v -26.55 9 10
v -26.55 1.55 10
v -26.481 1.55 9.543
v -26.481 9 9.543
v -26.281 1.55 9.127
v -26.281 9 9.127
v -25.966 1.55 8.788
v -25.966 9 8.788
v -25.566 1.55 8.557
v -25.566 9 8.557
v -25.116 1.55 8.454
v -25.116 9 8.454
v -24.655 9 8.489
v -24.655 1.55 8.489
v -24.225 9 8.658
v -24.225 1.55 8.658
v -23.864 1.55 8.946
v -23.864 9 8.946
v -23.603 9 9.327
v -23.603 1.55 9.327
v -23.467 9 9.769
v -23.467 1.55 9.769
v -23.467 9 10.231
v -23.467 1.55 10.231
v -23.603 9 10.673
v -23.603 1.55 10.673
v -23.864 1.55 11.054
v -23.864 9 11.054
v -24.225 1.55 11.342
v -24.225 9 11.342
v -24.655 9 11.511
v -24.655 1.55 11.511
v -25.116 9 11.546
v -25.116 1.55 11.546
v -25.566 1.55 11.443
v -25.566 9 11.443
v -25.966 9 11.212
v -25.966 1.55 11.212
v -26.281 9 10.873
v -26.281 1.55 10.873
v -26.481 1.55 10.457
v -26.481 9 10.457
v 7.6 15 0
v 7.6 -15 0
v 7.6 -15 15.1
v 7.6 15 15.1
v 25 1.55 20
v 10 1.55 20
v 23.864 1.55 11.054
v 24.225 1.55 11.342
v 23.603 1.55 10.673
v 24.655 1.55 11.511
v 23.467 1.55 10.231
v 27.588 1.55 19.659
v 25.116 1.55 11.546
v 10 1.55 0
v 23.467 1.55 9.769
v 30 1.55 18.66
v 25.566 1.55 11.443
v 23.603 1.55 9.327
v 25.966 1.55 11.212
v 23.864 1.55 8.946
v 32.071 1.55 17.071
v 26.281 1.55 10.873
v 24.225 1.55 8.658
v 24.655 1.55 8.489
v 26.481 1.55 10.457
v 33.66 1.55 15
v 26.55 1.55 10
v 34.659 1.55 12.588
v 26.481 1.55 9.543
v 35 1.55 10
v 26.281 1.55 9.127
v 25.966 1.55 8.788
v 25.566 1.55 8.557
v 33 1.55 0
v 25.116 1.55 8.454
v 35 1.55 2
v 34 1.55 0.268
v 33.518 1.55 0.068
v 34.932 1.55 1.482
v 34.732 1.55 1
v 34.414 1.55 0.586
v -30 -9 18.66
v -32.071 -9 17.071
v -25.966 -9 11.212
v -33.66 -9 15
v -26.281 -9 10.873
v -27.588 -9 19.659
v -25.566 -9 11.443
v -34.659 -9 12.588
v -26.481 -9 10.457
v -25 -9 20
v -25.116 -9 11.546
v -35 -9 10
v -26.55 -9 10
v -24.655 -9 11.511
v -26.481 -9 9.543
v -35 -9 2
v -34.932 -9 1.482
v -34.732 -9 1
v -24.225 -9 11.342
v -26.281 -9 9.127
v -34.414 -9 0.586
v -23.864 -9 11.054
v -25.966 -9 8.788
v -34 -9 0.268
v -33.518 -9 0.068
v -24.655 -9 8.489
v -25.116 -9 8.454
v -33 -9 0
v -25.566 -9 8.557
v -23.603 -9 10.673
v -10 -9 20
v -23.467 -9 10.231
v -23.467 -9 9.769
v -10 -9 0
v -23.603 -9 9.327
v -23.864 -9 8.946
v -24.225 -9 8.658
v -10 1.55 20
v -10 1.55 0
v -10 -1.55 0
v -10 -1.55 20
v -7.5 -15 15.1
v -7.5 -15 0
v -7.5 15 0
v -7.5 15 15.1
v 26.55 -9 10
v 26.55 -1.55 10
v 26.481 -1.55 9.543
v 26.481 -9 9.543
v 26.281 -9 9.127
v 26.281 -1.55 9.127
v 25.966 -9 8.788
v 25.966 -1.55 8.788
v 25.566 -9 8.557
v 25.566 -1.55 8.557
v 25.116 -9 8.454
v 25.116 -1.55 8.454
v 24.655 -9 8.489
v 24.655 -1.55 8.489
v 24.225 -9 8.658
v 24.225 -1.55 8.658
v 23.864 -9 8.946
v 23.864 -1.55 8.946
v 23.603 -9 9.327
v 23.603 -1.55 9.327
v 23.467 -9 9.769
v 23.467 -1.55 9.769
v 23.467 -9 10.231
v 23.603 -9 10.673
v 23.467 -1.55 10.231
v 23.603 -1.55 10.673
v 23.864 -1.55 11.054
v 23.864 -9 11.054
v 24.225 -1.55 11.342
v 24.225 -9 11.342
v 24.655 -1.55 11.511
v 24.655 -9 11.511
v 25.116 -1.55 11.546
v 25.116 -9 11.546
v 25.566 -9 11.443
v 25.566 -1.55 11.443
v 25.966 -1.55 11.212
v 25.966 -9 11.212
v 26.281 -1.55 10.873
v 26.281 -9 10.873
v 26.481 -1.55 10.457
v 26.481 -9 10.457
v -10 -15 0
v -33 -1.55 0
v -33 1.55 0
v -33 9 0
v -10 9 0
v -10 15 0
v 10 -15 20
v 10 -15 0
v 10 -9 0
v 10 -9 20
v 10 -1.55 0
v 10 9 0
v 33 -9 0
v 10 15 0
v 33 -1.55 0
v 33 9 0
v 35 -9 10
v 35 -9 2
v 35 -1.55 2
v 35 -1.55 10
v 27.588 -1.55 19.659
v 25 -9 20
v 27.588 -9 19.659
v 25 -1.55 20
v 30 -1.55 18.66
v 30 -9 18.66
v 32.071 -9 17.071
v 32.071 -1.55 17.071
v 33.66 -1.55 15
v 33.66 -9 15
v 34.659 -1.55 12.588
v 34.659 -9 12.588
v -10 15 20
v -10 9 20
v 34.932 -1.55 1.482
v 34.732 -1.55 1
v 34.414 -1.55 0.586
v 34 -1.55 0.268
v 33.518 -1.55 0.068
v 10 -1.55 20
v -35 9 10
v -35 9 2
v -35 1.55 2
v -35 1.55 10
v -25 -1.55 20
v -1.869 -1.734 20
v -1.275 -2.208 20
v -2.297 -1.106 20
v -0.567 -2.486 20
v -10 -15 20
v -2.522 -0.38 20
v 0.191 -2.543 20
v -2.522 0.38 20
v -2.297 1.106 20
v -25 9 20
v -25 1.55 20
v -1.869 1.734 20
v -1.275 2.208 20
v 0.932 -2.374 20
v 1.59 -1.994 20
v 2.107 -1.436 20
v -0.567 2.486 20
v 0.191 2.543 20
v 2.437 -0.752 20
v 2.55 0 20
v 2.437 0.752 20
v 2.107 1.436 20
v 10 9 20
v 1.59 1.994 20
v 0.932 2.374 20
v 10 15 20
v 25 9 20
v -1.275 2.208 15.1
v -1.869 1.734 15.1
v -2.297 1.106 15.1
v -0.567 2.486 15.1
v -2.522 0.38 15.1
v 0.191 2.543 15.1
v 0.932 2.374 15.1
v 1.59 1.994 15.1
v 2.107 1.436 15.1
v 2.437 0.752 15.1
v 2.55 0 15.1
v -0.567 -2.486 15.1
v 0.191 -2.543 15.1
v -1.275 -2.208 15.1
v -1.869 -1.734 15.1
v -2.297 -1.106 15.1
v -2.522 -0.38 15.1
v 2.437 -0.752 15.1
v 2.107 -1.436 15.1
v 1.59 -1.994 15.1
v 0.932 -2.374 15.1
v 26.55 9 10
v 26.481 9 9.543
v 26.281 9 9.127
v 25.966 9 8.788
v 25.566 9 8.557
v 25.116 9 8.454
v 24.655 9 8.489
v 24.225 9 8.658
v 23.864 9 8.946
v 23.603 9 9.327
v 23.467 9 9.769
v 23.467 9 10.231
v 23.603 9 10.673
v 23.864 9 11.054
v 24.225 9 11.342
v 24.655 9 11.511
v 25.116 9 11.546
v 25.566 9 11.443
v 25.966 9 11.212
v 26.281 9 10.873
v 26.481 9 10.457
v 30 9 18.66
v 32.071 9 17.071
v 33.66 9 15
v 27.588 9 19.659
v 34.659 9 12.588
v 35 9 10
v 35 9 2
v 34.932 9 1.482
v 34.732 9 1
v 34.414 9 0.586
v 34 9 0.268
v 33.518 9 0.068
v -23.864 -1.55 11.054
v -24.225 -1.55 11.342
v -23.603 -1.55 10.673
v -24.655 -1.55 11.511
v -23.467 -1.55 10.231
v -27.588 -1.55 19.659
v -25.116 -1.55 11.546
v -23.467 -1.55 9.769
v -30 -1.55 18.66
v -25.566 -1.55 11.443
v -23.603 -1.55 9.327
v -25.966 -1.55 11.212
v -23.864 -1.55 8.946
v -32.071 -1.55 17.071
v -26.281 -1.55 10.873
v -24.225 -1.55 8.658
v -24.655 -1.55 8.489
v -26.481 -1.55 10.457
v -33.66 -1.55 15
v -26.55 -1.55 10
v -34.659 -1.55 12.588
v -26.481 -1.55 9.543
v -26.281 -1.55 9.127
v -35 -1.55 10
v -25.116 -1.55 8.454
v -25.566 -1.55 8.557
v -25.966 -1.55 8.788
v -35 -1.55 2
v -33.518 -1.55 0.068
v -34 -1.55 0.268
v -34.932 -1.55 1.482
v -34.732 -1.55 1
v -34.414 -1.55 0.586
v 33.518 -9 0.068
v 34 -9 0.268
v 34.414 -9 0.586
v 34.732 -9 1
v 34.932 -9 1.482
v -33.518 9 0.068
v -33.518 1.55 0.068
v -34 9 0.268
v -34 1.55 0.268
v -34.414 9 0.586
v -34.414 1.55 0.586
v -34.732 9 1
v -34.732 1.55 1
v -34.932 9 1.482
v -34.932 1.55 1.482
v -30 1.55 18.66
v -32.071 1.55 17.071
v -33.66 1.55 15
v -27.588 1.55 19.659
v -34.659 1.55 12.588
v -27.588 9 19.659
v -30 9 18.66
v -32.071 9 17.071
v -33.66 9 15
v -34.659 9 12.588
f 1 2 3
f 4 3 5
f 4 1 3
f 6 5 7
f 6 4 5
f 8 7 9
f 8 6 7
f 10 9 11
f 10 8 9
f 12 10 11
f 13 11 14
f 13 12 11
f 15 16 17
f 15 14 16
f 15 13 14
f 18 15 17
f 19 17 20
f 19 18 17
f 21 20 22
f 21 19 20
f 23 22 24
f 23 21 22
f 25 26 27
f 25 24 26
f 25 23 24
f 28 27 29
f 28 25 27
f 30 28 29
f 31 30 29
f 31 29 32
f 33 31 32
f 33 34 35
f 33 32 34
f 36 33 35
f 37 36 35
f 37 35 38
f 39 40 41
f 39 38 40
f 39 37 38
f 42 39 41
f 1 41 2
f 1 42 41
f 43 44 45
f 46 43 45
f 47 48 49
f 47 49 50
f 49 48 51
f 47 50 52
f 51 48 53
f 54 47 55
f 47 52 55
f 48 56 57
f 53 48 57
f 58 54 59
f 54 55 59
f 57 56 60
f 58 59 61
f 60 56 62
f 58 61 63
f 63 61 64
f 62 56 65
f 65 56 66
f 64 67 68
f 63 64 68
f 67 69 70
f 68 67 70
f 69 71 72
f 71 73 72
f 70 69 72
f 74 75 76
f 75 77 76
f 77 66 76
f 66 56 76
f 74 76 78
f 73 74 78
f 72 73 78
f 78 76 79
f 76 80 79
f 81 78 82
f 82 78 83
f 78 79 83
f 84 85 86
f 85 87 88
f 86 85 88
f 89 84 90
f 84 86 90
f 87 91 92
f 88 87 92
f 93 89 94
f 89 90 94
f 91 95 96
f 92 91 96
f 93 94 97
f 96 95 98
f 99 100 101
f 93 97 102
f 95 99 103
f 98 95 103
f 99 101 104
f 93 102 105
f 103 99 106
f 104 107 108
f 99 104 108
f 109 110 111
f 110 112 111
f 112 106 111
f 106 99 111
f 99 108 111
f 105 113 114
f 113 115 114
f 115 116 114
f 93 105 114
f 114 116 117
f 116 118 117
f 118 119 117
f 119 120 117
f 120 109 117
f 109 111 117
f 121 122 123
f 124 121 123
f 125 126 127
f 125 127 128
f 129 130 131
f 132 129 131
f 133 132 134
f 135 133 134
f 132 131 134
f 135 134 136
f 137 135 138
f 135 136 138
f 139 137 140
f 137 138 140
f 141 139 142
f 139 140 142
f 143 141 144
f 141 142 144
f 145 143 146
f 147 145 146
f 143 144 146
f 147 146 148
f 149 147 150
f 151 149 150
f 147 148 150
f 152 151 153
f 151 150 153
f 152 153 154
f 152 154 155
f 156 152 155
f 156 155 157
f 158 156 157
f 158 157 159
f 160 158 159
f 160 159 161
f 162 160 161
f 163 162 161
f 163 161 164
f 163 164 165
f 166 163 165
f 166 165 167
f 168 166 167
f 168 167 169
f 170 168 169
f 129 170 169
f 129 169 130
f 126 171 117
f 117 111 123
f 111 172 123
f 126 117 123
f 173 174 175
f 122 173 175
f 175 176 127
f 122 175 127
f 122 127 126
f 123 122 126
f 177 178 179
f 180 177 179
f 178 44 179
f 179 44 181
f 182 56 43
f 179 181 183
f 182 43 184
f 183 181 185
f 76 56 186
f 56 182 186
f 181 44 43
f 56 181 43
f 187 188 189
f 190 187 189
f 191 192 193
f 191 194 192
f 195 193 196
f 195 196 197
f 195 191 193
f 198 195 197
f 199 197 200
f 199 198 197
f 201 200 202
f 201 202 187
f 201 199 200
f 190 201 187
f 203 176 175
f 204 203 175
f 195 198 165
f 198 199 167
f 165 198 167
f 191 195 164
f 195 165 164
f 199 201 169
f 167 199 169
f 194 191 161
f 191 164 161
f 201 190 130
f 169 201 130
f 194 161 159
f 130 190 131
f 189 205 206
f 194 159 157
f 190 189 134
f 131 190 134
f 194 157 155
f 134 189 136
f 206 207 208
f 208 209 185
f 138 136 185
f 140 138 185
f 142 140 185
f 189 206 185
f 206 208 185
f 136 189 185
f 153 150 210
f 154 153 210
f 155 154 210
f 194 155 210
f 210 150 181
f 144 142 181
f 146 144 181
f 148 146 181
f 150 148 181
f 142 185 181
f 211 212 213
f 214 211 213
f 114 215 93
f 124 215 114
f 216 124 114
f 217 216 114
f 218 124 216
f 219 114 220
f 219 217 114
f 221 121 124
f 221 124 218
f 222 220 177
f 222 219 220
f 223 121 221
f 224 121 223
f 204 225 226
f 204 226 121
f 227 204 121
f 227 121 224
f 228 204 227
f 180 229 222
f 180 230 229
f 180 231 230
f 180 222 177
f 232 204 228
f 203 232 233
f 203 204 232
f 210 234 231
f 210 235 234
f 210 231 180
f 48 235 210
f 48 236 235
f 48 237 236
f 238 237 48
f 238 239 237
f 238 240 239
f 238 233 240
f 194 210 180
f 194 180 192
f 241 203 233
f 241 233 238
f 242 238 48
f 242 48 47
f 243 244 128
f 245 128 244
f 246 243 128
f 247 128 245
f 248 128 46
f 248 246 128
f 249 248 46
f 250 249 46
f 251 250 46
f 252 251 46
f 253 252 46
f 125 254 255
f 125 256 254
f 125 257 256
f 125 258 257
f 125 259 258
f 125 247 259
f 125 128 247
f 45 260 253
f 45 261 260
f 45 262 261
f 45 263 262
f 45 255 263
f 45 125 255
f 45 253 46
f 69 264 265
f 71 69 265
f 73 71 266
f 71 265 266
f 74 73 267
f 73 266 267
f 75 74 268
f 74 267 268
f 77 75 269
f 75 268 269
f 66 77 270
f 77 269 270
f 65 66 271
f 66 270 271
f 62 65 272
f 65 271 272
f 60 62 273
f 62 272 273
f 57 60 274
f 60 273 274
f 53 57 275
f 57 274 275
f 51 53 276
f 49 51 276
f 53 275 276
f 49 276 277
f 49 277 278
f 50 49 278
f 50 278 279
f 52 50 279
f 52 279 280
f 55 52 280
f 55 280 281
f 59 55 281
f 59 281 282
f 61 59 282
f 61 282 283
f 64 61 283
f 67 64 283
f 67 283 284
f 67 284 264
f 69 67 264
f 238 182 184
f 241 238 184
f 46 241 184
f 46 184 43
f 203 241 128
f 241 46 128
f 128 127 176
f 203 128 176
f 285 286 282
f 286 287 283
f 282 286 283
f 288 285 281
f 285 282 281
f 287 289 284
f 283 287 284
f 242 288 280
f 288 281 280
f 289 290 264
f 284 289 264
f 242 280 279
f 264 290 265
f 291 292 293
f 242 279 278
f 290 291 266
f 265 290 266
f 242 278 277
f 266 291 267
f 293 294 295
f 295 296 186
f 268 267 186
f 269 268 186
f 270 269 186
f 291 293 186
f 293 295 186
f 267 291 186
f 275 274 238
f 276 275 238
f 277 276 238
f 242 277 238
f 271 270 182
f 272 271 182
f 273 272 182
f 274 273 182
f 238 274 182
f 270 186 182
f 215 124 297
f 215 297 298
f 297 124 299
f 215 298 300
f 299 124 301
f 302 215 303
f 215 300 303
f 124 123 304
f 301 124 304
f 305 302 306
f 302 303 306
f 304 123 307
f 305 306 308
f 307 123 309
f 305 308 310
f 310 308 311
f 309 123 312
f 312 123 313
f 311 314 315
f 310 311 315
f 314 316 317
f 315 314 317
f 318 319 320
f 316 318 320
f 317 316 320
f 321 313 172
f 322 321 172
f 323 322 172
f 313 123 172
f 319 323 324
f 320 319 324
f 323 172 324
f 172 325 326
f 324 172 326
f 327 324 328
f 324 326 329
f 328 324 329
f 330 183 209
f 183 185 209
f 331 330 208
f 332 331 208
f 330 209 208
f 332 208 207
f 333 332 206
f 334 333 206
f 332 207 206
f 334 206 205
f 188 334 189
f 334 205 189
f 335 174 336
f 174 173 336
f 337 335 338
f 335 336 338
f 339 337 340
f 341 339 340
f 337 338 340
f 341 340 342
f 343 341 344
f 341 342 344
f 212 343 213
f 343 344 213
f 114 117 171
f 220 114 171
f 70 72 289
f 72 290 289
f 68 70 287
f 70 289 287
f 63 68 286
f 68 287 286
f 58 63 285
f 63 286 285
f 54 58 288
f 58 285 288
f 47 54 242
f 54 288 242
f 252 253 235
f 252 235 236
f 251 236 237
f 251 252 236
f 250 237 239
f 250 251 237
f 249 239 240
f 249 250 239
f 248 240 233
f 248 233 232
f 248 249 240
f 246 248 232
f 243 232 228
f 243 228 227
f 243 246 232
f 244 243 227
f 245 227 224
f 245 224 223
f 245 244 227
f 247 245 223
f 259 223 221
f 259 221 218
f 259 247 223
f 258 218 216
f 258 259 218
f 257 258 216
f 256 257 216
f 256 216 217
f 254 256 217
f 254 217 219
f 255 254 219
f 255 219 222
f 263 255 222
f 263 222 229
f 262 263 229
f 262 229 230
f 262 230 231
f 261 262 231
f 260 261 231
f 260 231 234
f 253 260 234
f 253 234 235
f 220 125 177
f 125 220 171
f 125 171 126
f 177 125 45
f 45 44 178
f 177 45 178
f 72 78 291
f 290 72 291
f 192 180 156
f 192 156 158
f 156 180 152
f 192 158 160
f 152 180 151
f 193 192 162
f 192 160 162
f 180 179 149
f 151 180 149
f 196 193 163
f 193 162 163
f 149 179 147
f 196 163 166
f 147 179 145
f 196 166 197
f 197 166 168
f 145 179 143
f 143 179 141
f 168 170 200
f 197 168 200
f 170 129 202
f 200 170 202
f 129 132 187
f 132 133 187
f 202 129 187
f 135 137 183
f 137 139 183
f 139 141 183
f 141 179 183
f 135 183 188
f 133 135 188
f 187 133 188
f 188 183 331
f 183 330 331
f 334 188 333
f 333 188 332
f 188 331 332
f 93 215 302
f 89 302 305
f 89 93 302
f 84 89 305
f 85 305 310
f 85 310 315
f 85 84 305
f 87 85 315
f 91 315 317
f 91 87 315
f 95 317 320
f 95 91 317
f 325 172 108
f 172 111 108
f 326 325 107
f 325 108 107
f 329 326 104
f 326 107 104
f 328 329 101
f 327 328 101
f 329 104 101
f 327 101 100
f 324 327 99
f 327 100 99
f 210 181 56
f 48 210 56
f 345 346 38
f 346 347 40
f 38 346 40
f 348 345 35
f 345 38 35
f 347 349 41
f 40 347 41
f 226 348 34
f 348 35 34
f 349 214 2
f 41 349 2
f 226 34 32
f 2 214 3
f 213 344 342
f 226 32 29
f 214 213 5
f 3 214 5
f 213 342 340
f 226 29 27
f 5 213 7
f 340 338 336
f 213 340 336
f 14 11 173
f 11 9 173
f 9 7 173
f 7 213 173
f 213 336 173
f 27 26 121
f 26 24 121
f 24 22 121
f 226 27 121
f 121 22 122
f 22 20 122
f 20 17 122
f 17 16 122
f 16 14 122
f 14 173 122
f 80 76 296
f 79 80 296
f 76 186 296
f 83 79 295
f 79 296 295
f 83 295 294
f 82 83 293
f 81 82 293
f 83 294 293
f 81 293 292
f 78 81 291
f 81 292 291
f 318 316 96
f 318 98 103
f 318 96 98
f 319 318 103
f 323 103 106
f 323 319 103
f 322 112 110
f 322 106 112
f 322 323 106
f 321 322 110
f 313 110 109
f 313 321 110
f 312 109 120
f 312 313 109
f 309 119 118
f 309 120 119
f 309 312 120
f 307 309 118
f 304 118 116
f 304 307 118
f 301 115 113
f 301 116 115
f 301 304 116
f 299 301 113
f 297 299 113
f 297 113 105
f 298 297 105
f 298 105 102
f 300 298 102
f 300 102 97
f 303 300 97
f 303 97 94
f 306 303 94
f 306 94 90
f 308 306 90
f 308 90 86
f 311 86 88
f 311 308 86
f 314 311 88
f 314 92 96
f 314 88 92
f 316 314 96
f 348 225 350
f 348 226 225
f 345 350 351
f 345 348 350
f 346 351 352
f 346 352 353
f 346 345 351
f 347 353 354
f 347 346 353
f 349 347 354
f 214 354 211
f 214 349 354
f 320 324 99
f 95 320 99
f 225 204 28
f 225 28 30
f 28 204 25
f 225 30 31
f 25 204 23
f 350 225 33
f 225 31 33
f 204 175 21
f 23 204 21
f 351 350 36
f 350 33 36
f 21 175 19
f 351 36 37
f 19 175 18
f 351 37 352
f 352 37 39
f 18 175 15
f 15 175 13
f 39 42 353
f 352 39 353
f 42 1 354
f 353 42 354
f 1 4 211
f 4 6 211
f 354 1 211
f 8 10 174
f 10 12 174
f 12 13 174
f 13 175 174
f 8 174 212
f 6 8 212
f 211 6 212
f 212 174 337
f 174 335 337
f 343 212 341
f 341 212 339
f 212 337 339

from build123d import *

# Parameters (mm, degrees)
SKETCH_1_R          = 2.55
EXTRUDE_1_DEPTH     = 20
CUT_EXTRUDE_1_REACH = 32
SKETCH_2_W          = 15.1
SKETCH_2_H          = 15.1
SKETCH_3_R          = 1.55
CUT_EXTRUDE_2_DEPTH = 100
FILLET_1_R          = 2
FILLET_2_R          = 10


with BuildPart() as part:
    # 草图1 → 凸台-拉伸1 (new body)
    with BuildSketch(Plane.XY):
        Polygon((10, 9), (10, 15), (-10, 15), (-10, 9), (-35, 9), (-35, 1.55), (-10, 1.55), (-10, -1.55), (-35, -1.55), (-35, -9), (-10, -9), (-10, -15), (10, -15), (10, -9), (35, -9), (35, -1.55), (10, -1.55), (10, 1.55), (35, 1.55), (35, 9), align=None)
        Circle(SKETCH_1_R, mode=Mode.SUBTRACT)
    extrude(amount=EXTRUDE_1_DEPTH)

    # 草图2 → 切除-拉伸1 (cut, up to next)
    with BuildSketch(Plane.XZ.offset(15), mode=Mode.PRIVATE) as cut_extrude_1_sk1:
        with Locations((0.05, 7.55)):
            Rectangle(SKETCH_2_W, SKETCH_2_H)
    cut_extrude_1_tool1 = extrude(cut_extrude_1_sk1.sketch, amount=-CUT_EXTRUDE_1_REACH, mode=Mode.PRIVATE) & part.part
    add(cut_extrude_1_tool1.solids().sort_by_distance((0.05, -15, 7.55))[0], mode=Mode.SUBTRACT)

    # 草图3 → 切除-拉伸2 (cut)
    with BuildSketch(Plane(origin=(0, 9, 0), x_dir=(1, 0, 0), z_dir=(0, 1, 0))):
        with Locations((25, -10)):
            Circle(SKETCH_3_R)
    cut_extrude_2 = extrude(amount=-CUT_EXTRUDE_2_DEPTH, mode=Mode.SUBTRACT)

    # 镜向1: 切除-拉伸2 across plane
    add(cut_extrude_2.mirror(Plane(origin=(0, 0, 0), x_dir=(0, 0, 1), z_dir=(1, 0, 0))), mode=Mode.SUBTRACT)

    # 圆角1
    fillet_1_edges = [part.edges().sort_by_distance(p)[0] for p in [
        (-35, -5.275, 0),
        (-35, 5.275, 0),
        (35, 5.275, 0),
        (35, -5.275, 0),
    ]]
    fillet(fillet_1_edges, radius=FILLET_1_R)

    # 圆角2
    fillet_2_edges = [part.edges().sort_by_distance(p)[0] for p in [
        (35, -5.275, 20),
        (35, 5.275, 20),
        (-35, 5.275, 20),
        (-35, -5.275, 20),
    ]]
    fillet(fillet_2_edges, radius=FILLET_2_R)


solid = part.part
